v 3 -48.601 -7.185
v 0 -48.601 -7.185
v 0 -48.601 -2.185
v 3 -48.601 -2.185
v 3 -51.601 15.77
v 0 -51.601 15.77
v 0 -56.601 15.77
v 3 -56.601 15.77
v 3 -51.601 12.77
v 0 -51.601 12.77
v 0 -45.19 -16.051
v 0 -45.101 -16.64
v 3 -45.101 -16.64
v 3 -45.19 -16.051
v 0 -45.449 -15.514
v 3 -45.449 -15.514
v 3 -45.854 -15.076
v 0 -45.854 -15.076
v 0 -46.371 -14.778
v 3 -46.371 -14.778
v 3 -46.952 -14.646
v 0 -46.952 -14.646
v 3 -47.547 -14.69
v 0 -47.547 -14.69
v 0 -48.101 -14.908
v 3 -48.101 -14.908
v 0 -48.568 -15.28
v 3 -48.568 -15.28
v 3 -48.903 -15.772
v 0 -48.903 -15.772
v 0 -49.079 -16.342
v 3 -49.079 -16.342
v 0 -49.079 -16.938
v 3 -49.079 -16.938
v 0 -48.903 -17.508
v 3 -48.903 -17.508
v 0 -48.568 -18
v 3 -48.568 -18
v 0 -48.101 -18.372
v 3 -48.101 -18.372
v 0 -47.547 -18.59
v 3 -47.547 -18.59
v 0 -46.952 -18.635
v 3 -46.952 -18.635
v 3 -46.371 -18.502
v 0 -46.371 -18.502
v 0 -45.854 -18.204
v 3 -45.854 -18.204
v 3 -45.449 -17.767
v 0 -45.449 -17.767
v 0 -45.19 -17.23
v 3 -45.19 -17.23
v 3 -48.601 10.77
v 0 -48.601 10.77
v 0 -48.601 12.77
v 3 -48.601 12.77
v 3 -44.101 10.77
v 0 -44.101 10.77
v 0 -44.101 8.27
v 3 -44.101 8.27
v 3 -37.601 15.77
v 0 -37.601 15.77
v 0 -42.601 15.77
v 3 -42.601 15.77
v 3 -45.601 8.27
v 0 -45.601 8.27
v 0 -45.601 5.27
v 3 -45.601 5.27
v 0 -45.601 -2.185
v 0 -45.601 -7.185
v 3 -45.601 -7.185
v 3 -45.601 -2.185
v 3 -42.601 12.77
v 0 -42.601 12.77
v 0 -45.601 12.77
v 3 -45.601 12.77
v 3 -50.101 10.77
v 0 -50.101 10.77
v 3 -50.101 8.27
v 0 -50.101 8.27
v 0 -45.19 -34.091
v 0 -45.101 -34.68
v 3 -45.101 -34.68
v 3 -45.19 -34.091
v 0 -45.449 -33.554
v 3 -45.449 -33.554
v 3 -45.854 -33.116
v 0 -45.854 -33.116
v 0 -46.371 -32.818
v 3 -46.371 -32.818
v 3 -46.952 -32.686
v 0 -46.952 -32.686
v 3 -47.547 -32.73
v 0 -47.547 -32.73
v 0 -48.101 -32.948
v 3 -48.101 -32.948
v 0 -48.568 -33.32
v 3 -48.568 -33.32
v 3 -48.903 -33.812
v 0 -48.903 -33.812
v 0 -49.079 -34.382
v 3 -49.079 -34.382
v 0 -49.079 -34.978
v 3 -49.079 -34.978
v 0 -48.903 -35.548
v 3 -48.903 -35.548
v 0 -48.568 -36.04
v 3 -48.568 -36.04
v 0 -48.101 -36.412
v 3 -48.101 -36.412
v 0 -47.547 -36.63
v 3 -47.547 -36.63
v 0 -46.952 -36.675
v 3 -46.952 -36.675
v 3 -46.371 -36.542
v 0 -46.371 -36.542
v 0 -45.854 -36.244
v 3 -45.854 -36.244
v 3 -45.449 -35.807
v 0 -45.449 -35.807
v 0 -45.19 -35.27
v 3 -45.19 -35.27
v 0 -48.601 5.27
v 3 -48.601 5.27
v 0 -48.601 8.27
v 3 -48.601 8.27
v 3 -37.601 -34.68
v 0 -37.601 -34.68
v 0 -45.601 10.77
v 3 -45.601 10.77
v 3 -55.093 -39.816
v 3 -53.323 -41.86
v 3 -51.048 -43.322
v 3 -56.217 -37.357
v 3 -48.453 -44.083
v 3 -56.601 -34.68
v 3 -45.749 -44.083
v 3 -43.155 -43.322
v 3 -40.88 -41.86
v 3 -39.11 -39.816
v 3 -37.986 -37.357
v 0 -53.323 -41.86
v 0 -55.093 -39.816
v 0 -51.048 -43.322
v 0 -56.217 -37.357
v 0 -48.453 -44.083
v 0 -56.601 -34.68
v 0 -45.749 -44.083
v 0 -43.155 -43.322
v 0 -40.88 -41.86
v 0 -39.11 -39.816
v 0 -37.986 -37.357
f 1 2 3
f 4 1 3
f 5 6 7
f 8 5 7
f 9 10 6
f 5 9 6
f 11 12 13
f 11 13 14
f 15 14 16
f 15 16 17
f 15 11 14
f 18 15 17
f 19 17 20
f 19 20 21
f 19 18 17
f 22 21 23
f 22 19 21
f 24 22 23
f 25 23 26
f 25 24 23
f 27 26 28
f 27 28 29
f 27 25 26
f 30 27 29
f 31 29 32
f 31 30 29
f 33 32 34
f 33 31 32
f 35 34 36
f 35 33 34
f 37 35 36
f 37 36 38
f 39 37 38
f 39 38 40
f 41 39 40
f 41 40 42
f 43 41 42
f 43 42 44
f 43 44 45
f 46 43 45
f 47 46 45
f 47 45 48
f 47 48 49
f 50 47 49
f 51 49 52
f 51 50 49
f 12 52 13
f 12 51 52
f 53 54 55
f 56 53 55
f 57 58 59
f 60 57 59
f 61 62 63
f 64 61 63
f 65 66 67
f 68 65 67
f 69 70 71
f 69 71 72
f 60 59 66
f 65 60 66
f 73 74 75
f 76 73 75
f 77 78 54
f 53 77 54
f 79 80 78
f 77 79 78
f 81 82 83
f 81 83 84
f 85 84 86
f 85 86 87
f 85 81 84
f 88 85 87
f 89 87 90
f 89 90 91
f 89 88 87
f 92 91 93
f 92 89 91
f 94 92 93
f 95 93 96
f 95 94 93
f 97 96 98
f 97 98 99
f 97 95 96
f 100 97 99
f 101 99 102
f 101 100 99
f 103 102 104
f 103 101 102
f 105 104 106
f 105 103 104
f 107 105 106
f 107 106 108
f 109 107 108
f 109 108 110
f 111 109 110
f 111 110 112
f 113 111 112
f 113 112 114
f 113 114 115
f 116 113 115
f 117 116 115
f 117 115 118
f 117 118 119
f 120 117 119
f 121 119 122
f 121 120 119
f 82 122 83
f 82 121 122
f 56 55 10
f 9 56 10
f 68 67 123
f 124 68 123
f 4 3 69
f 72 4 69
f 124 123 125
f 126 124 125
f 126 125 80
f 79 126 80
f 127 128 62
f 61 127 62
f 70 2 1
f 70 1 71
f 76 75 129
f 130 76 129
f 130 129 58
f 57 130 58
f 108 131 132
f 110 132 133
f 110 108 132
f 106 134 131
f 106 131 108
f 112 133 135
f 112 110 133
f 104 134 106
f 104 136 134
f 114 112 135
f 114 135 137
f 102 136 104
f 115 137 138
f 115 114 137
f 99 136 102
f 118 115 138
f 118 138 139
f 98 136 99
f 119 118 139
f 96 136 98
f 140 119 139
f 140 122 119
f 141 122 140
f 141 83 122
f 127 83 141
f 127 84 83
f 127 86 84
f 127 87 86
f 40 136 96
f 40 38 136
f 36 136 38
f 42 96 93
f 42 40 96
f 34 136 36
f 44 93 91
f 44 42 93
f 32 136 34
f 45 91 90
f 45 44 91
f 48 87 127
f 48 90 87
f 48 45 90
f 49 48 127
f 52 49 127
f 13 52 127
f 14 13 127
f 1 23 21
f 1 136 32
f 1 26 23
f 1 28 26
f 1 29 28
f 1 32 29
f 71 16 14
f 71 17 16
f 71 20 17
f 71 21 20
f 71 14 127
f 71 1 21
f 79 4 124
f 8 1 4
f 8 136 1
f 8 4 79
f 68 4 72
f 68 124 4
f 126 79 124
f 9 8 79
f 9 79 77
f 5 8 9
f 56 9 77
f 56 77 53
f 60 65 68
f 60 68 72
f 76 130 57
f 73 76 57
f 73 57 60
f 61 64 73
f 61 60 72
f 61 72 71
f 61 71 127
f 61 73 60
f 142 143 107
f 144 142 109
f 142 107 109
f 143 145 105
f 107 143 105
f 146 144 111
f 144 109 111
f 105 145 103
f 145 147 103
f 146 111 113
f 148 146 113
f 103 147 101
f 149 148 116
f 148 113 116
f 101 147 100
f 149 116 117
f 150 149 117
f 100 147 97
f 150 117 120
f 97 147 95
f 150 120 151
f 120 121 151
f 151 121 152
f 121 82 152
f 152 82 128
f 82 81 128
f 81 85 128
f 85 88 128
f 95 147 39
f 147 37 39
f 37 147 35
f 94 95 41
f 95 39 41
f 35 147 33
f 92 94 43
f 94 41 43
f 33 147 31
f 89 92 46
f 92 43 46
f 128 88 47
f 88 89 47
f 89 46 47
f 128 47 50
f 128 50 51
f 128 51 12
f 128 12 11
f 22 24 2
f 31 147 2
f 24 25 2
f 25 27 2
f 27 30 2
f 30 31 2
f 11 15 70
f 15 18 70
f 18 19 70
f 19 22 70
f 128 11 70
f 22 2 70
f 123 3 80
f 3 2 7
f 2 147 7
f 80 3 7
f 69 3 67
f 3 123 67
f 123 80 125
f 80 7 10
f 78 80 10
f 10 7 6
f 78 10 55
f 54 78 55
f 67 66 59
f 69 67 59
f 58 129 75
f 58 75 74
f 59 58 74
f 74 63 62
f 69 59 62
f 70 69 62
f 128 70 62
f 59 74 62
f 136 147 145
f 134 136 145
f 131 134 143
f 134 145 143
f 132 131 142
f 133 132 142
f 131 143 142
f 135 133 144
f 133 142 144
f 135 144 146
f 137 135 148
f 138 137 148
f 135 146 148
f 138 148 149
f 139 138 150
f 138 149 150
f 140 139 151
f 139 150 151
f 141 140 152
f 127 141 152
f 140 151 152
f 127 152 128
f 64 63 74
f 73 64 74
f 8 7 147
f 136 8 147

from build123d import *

# Parameters (mm, degrees)
F0_R     = 2
F0_W     = 3
F0_H     = 5
F1_DEPTH = 3


with BuildPart() as f1:
    # F0 (on Right) → F1 (new body)
    with BuildSketch(Plane.YZ):
        with BuildLine():
            Line((-51.601472, 15.769853), (-56.601472, 15.769853))
            Line((-56.601472, 15.769853), (-56.601472, -34.680147))
            ThreePointArc((-56.601472, -34.680147), (-47.101472, -44.180147), (-37.601472, -34.680147))
            Line((-37.601472, -34.680147), (-37.601472, 15.769853))
            Line((-37.601472, 15.769853), (-42.601472, 15.769853))
            Line((-42.601472, 15.769853), (-42.601472, 12.769853))
            Line((-42.601472, 12.769853), (-45.601472, 12.769853))
            Line((-45.601472, 12.769853), (-45.601472, 10.769853))
            Line((-45.601472, 10.769853), (-44.101472, 10.769853))
            Line((-44.101472, 10.769853), (-44.101472, 8.269853))
            Line((-44.101472, 8.269853), (-45.601472, 8.269853))
            Line((-45.601472, 8.269853), (-45.601472, 5.269853))
            Line((-45.601472, 5.269853), (-48.601472, 5.269853))
            Line((-48.601472, 5.269853), (-48.601472, 8.269853))
            Line((-48.601472, 8.269853), (-50.101472, 8.269853))
            Line((-50.101472, 8.269853), (-50.101472, 10.769853))
            Line((-50.101472, 10.769853), (-48.601472, 10.769853))
            Line((-48.601472, 10.769853), (-48.601472, 12.769853))
            Line((-48.601472, 12.769853), (-51.601472, 12.769853))
            Line((-51.601472, 12.769853), (-51.601472, 15.769853))
        make_face()
        with Locations((-47.101472, -34.680147)):
            Circle(F0_R, mode=Mode.SUBTRACT)
        with Locations((-47.101472, -16.640147)):
            Circle(F0_R, mode=Mode.SUBTRACT)
        with Locations((-47.101472, -4.685147)):
            Rectangle(F0_W, F0_H, mode=Mode.SUBTRACT)
    extrude(amount=F1_DEPTH)


solid = f1.part
